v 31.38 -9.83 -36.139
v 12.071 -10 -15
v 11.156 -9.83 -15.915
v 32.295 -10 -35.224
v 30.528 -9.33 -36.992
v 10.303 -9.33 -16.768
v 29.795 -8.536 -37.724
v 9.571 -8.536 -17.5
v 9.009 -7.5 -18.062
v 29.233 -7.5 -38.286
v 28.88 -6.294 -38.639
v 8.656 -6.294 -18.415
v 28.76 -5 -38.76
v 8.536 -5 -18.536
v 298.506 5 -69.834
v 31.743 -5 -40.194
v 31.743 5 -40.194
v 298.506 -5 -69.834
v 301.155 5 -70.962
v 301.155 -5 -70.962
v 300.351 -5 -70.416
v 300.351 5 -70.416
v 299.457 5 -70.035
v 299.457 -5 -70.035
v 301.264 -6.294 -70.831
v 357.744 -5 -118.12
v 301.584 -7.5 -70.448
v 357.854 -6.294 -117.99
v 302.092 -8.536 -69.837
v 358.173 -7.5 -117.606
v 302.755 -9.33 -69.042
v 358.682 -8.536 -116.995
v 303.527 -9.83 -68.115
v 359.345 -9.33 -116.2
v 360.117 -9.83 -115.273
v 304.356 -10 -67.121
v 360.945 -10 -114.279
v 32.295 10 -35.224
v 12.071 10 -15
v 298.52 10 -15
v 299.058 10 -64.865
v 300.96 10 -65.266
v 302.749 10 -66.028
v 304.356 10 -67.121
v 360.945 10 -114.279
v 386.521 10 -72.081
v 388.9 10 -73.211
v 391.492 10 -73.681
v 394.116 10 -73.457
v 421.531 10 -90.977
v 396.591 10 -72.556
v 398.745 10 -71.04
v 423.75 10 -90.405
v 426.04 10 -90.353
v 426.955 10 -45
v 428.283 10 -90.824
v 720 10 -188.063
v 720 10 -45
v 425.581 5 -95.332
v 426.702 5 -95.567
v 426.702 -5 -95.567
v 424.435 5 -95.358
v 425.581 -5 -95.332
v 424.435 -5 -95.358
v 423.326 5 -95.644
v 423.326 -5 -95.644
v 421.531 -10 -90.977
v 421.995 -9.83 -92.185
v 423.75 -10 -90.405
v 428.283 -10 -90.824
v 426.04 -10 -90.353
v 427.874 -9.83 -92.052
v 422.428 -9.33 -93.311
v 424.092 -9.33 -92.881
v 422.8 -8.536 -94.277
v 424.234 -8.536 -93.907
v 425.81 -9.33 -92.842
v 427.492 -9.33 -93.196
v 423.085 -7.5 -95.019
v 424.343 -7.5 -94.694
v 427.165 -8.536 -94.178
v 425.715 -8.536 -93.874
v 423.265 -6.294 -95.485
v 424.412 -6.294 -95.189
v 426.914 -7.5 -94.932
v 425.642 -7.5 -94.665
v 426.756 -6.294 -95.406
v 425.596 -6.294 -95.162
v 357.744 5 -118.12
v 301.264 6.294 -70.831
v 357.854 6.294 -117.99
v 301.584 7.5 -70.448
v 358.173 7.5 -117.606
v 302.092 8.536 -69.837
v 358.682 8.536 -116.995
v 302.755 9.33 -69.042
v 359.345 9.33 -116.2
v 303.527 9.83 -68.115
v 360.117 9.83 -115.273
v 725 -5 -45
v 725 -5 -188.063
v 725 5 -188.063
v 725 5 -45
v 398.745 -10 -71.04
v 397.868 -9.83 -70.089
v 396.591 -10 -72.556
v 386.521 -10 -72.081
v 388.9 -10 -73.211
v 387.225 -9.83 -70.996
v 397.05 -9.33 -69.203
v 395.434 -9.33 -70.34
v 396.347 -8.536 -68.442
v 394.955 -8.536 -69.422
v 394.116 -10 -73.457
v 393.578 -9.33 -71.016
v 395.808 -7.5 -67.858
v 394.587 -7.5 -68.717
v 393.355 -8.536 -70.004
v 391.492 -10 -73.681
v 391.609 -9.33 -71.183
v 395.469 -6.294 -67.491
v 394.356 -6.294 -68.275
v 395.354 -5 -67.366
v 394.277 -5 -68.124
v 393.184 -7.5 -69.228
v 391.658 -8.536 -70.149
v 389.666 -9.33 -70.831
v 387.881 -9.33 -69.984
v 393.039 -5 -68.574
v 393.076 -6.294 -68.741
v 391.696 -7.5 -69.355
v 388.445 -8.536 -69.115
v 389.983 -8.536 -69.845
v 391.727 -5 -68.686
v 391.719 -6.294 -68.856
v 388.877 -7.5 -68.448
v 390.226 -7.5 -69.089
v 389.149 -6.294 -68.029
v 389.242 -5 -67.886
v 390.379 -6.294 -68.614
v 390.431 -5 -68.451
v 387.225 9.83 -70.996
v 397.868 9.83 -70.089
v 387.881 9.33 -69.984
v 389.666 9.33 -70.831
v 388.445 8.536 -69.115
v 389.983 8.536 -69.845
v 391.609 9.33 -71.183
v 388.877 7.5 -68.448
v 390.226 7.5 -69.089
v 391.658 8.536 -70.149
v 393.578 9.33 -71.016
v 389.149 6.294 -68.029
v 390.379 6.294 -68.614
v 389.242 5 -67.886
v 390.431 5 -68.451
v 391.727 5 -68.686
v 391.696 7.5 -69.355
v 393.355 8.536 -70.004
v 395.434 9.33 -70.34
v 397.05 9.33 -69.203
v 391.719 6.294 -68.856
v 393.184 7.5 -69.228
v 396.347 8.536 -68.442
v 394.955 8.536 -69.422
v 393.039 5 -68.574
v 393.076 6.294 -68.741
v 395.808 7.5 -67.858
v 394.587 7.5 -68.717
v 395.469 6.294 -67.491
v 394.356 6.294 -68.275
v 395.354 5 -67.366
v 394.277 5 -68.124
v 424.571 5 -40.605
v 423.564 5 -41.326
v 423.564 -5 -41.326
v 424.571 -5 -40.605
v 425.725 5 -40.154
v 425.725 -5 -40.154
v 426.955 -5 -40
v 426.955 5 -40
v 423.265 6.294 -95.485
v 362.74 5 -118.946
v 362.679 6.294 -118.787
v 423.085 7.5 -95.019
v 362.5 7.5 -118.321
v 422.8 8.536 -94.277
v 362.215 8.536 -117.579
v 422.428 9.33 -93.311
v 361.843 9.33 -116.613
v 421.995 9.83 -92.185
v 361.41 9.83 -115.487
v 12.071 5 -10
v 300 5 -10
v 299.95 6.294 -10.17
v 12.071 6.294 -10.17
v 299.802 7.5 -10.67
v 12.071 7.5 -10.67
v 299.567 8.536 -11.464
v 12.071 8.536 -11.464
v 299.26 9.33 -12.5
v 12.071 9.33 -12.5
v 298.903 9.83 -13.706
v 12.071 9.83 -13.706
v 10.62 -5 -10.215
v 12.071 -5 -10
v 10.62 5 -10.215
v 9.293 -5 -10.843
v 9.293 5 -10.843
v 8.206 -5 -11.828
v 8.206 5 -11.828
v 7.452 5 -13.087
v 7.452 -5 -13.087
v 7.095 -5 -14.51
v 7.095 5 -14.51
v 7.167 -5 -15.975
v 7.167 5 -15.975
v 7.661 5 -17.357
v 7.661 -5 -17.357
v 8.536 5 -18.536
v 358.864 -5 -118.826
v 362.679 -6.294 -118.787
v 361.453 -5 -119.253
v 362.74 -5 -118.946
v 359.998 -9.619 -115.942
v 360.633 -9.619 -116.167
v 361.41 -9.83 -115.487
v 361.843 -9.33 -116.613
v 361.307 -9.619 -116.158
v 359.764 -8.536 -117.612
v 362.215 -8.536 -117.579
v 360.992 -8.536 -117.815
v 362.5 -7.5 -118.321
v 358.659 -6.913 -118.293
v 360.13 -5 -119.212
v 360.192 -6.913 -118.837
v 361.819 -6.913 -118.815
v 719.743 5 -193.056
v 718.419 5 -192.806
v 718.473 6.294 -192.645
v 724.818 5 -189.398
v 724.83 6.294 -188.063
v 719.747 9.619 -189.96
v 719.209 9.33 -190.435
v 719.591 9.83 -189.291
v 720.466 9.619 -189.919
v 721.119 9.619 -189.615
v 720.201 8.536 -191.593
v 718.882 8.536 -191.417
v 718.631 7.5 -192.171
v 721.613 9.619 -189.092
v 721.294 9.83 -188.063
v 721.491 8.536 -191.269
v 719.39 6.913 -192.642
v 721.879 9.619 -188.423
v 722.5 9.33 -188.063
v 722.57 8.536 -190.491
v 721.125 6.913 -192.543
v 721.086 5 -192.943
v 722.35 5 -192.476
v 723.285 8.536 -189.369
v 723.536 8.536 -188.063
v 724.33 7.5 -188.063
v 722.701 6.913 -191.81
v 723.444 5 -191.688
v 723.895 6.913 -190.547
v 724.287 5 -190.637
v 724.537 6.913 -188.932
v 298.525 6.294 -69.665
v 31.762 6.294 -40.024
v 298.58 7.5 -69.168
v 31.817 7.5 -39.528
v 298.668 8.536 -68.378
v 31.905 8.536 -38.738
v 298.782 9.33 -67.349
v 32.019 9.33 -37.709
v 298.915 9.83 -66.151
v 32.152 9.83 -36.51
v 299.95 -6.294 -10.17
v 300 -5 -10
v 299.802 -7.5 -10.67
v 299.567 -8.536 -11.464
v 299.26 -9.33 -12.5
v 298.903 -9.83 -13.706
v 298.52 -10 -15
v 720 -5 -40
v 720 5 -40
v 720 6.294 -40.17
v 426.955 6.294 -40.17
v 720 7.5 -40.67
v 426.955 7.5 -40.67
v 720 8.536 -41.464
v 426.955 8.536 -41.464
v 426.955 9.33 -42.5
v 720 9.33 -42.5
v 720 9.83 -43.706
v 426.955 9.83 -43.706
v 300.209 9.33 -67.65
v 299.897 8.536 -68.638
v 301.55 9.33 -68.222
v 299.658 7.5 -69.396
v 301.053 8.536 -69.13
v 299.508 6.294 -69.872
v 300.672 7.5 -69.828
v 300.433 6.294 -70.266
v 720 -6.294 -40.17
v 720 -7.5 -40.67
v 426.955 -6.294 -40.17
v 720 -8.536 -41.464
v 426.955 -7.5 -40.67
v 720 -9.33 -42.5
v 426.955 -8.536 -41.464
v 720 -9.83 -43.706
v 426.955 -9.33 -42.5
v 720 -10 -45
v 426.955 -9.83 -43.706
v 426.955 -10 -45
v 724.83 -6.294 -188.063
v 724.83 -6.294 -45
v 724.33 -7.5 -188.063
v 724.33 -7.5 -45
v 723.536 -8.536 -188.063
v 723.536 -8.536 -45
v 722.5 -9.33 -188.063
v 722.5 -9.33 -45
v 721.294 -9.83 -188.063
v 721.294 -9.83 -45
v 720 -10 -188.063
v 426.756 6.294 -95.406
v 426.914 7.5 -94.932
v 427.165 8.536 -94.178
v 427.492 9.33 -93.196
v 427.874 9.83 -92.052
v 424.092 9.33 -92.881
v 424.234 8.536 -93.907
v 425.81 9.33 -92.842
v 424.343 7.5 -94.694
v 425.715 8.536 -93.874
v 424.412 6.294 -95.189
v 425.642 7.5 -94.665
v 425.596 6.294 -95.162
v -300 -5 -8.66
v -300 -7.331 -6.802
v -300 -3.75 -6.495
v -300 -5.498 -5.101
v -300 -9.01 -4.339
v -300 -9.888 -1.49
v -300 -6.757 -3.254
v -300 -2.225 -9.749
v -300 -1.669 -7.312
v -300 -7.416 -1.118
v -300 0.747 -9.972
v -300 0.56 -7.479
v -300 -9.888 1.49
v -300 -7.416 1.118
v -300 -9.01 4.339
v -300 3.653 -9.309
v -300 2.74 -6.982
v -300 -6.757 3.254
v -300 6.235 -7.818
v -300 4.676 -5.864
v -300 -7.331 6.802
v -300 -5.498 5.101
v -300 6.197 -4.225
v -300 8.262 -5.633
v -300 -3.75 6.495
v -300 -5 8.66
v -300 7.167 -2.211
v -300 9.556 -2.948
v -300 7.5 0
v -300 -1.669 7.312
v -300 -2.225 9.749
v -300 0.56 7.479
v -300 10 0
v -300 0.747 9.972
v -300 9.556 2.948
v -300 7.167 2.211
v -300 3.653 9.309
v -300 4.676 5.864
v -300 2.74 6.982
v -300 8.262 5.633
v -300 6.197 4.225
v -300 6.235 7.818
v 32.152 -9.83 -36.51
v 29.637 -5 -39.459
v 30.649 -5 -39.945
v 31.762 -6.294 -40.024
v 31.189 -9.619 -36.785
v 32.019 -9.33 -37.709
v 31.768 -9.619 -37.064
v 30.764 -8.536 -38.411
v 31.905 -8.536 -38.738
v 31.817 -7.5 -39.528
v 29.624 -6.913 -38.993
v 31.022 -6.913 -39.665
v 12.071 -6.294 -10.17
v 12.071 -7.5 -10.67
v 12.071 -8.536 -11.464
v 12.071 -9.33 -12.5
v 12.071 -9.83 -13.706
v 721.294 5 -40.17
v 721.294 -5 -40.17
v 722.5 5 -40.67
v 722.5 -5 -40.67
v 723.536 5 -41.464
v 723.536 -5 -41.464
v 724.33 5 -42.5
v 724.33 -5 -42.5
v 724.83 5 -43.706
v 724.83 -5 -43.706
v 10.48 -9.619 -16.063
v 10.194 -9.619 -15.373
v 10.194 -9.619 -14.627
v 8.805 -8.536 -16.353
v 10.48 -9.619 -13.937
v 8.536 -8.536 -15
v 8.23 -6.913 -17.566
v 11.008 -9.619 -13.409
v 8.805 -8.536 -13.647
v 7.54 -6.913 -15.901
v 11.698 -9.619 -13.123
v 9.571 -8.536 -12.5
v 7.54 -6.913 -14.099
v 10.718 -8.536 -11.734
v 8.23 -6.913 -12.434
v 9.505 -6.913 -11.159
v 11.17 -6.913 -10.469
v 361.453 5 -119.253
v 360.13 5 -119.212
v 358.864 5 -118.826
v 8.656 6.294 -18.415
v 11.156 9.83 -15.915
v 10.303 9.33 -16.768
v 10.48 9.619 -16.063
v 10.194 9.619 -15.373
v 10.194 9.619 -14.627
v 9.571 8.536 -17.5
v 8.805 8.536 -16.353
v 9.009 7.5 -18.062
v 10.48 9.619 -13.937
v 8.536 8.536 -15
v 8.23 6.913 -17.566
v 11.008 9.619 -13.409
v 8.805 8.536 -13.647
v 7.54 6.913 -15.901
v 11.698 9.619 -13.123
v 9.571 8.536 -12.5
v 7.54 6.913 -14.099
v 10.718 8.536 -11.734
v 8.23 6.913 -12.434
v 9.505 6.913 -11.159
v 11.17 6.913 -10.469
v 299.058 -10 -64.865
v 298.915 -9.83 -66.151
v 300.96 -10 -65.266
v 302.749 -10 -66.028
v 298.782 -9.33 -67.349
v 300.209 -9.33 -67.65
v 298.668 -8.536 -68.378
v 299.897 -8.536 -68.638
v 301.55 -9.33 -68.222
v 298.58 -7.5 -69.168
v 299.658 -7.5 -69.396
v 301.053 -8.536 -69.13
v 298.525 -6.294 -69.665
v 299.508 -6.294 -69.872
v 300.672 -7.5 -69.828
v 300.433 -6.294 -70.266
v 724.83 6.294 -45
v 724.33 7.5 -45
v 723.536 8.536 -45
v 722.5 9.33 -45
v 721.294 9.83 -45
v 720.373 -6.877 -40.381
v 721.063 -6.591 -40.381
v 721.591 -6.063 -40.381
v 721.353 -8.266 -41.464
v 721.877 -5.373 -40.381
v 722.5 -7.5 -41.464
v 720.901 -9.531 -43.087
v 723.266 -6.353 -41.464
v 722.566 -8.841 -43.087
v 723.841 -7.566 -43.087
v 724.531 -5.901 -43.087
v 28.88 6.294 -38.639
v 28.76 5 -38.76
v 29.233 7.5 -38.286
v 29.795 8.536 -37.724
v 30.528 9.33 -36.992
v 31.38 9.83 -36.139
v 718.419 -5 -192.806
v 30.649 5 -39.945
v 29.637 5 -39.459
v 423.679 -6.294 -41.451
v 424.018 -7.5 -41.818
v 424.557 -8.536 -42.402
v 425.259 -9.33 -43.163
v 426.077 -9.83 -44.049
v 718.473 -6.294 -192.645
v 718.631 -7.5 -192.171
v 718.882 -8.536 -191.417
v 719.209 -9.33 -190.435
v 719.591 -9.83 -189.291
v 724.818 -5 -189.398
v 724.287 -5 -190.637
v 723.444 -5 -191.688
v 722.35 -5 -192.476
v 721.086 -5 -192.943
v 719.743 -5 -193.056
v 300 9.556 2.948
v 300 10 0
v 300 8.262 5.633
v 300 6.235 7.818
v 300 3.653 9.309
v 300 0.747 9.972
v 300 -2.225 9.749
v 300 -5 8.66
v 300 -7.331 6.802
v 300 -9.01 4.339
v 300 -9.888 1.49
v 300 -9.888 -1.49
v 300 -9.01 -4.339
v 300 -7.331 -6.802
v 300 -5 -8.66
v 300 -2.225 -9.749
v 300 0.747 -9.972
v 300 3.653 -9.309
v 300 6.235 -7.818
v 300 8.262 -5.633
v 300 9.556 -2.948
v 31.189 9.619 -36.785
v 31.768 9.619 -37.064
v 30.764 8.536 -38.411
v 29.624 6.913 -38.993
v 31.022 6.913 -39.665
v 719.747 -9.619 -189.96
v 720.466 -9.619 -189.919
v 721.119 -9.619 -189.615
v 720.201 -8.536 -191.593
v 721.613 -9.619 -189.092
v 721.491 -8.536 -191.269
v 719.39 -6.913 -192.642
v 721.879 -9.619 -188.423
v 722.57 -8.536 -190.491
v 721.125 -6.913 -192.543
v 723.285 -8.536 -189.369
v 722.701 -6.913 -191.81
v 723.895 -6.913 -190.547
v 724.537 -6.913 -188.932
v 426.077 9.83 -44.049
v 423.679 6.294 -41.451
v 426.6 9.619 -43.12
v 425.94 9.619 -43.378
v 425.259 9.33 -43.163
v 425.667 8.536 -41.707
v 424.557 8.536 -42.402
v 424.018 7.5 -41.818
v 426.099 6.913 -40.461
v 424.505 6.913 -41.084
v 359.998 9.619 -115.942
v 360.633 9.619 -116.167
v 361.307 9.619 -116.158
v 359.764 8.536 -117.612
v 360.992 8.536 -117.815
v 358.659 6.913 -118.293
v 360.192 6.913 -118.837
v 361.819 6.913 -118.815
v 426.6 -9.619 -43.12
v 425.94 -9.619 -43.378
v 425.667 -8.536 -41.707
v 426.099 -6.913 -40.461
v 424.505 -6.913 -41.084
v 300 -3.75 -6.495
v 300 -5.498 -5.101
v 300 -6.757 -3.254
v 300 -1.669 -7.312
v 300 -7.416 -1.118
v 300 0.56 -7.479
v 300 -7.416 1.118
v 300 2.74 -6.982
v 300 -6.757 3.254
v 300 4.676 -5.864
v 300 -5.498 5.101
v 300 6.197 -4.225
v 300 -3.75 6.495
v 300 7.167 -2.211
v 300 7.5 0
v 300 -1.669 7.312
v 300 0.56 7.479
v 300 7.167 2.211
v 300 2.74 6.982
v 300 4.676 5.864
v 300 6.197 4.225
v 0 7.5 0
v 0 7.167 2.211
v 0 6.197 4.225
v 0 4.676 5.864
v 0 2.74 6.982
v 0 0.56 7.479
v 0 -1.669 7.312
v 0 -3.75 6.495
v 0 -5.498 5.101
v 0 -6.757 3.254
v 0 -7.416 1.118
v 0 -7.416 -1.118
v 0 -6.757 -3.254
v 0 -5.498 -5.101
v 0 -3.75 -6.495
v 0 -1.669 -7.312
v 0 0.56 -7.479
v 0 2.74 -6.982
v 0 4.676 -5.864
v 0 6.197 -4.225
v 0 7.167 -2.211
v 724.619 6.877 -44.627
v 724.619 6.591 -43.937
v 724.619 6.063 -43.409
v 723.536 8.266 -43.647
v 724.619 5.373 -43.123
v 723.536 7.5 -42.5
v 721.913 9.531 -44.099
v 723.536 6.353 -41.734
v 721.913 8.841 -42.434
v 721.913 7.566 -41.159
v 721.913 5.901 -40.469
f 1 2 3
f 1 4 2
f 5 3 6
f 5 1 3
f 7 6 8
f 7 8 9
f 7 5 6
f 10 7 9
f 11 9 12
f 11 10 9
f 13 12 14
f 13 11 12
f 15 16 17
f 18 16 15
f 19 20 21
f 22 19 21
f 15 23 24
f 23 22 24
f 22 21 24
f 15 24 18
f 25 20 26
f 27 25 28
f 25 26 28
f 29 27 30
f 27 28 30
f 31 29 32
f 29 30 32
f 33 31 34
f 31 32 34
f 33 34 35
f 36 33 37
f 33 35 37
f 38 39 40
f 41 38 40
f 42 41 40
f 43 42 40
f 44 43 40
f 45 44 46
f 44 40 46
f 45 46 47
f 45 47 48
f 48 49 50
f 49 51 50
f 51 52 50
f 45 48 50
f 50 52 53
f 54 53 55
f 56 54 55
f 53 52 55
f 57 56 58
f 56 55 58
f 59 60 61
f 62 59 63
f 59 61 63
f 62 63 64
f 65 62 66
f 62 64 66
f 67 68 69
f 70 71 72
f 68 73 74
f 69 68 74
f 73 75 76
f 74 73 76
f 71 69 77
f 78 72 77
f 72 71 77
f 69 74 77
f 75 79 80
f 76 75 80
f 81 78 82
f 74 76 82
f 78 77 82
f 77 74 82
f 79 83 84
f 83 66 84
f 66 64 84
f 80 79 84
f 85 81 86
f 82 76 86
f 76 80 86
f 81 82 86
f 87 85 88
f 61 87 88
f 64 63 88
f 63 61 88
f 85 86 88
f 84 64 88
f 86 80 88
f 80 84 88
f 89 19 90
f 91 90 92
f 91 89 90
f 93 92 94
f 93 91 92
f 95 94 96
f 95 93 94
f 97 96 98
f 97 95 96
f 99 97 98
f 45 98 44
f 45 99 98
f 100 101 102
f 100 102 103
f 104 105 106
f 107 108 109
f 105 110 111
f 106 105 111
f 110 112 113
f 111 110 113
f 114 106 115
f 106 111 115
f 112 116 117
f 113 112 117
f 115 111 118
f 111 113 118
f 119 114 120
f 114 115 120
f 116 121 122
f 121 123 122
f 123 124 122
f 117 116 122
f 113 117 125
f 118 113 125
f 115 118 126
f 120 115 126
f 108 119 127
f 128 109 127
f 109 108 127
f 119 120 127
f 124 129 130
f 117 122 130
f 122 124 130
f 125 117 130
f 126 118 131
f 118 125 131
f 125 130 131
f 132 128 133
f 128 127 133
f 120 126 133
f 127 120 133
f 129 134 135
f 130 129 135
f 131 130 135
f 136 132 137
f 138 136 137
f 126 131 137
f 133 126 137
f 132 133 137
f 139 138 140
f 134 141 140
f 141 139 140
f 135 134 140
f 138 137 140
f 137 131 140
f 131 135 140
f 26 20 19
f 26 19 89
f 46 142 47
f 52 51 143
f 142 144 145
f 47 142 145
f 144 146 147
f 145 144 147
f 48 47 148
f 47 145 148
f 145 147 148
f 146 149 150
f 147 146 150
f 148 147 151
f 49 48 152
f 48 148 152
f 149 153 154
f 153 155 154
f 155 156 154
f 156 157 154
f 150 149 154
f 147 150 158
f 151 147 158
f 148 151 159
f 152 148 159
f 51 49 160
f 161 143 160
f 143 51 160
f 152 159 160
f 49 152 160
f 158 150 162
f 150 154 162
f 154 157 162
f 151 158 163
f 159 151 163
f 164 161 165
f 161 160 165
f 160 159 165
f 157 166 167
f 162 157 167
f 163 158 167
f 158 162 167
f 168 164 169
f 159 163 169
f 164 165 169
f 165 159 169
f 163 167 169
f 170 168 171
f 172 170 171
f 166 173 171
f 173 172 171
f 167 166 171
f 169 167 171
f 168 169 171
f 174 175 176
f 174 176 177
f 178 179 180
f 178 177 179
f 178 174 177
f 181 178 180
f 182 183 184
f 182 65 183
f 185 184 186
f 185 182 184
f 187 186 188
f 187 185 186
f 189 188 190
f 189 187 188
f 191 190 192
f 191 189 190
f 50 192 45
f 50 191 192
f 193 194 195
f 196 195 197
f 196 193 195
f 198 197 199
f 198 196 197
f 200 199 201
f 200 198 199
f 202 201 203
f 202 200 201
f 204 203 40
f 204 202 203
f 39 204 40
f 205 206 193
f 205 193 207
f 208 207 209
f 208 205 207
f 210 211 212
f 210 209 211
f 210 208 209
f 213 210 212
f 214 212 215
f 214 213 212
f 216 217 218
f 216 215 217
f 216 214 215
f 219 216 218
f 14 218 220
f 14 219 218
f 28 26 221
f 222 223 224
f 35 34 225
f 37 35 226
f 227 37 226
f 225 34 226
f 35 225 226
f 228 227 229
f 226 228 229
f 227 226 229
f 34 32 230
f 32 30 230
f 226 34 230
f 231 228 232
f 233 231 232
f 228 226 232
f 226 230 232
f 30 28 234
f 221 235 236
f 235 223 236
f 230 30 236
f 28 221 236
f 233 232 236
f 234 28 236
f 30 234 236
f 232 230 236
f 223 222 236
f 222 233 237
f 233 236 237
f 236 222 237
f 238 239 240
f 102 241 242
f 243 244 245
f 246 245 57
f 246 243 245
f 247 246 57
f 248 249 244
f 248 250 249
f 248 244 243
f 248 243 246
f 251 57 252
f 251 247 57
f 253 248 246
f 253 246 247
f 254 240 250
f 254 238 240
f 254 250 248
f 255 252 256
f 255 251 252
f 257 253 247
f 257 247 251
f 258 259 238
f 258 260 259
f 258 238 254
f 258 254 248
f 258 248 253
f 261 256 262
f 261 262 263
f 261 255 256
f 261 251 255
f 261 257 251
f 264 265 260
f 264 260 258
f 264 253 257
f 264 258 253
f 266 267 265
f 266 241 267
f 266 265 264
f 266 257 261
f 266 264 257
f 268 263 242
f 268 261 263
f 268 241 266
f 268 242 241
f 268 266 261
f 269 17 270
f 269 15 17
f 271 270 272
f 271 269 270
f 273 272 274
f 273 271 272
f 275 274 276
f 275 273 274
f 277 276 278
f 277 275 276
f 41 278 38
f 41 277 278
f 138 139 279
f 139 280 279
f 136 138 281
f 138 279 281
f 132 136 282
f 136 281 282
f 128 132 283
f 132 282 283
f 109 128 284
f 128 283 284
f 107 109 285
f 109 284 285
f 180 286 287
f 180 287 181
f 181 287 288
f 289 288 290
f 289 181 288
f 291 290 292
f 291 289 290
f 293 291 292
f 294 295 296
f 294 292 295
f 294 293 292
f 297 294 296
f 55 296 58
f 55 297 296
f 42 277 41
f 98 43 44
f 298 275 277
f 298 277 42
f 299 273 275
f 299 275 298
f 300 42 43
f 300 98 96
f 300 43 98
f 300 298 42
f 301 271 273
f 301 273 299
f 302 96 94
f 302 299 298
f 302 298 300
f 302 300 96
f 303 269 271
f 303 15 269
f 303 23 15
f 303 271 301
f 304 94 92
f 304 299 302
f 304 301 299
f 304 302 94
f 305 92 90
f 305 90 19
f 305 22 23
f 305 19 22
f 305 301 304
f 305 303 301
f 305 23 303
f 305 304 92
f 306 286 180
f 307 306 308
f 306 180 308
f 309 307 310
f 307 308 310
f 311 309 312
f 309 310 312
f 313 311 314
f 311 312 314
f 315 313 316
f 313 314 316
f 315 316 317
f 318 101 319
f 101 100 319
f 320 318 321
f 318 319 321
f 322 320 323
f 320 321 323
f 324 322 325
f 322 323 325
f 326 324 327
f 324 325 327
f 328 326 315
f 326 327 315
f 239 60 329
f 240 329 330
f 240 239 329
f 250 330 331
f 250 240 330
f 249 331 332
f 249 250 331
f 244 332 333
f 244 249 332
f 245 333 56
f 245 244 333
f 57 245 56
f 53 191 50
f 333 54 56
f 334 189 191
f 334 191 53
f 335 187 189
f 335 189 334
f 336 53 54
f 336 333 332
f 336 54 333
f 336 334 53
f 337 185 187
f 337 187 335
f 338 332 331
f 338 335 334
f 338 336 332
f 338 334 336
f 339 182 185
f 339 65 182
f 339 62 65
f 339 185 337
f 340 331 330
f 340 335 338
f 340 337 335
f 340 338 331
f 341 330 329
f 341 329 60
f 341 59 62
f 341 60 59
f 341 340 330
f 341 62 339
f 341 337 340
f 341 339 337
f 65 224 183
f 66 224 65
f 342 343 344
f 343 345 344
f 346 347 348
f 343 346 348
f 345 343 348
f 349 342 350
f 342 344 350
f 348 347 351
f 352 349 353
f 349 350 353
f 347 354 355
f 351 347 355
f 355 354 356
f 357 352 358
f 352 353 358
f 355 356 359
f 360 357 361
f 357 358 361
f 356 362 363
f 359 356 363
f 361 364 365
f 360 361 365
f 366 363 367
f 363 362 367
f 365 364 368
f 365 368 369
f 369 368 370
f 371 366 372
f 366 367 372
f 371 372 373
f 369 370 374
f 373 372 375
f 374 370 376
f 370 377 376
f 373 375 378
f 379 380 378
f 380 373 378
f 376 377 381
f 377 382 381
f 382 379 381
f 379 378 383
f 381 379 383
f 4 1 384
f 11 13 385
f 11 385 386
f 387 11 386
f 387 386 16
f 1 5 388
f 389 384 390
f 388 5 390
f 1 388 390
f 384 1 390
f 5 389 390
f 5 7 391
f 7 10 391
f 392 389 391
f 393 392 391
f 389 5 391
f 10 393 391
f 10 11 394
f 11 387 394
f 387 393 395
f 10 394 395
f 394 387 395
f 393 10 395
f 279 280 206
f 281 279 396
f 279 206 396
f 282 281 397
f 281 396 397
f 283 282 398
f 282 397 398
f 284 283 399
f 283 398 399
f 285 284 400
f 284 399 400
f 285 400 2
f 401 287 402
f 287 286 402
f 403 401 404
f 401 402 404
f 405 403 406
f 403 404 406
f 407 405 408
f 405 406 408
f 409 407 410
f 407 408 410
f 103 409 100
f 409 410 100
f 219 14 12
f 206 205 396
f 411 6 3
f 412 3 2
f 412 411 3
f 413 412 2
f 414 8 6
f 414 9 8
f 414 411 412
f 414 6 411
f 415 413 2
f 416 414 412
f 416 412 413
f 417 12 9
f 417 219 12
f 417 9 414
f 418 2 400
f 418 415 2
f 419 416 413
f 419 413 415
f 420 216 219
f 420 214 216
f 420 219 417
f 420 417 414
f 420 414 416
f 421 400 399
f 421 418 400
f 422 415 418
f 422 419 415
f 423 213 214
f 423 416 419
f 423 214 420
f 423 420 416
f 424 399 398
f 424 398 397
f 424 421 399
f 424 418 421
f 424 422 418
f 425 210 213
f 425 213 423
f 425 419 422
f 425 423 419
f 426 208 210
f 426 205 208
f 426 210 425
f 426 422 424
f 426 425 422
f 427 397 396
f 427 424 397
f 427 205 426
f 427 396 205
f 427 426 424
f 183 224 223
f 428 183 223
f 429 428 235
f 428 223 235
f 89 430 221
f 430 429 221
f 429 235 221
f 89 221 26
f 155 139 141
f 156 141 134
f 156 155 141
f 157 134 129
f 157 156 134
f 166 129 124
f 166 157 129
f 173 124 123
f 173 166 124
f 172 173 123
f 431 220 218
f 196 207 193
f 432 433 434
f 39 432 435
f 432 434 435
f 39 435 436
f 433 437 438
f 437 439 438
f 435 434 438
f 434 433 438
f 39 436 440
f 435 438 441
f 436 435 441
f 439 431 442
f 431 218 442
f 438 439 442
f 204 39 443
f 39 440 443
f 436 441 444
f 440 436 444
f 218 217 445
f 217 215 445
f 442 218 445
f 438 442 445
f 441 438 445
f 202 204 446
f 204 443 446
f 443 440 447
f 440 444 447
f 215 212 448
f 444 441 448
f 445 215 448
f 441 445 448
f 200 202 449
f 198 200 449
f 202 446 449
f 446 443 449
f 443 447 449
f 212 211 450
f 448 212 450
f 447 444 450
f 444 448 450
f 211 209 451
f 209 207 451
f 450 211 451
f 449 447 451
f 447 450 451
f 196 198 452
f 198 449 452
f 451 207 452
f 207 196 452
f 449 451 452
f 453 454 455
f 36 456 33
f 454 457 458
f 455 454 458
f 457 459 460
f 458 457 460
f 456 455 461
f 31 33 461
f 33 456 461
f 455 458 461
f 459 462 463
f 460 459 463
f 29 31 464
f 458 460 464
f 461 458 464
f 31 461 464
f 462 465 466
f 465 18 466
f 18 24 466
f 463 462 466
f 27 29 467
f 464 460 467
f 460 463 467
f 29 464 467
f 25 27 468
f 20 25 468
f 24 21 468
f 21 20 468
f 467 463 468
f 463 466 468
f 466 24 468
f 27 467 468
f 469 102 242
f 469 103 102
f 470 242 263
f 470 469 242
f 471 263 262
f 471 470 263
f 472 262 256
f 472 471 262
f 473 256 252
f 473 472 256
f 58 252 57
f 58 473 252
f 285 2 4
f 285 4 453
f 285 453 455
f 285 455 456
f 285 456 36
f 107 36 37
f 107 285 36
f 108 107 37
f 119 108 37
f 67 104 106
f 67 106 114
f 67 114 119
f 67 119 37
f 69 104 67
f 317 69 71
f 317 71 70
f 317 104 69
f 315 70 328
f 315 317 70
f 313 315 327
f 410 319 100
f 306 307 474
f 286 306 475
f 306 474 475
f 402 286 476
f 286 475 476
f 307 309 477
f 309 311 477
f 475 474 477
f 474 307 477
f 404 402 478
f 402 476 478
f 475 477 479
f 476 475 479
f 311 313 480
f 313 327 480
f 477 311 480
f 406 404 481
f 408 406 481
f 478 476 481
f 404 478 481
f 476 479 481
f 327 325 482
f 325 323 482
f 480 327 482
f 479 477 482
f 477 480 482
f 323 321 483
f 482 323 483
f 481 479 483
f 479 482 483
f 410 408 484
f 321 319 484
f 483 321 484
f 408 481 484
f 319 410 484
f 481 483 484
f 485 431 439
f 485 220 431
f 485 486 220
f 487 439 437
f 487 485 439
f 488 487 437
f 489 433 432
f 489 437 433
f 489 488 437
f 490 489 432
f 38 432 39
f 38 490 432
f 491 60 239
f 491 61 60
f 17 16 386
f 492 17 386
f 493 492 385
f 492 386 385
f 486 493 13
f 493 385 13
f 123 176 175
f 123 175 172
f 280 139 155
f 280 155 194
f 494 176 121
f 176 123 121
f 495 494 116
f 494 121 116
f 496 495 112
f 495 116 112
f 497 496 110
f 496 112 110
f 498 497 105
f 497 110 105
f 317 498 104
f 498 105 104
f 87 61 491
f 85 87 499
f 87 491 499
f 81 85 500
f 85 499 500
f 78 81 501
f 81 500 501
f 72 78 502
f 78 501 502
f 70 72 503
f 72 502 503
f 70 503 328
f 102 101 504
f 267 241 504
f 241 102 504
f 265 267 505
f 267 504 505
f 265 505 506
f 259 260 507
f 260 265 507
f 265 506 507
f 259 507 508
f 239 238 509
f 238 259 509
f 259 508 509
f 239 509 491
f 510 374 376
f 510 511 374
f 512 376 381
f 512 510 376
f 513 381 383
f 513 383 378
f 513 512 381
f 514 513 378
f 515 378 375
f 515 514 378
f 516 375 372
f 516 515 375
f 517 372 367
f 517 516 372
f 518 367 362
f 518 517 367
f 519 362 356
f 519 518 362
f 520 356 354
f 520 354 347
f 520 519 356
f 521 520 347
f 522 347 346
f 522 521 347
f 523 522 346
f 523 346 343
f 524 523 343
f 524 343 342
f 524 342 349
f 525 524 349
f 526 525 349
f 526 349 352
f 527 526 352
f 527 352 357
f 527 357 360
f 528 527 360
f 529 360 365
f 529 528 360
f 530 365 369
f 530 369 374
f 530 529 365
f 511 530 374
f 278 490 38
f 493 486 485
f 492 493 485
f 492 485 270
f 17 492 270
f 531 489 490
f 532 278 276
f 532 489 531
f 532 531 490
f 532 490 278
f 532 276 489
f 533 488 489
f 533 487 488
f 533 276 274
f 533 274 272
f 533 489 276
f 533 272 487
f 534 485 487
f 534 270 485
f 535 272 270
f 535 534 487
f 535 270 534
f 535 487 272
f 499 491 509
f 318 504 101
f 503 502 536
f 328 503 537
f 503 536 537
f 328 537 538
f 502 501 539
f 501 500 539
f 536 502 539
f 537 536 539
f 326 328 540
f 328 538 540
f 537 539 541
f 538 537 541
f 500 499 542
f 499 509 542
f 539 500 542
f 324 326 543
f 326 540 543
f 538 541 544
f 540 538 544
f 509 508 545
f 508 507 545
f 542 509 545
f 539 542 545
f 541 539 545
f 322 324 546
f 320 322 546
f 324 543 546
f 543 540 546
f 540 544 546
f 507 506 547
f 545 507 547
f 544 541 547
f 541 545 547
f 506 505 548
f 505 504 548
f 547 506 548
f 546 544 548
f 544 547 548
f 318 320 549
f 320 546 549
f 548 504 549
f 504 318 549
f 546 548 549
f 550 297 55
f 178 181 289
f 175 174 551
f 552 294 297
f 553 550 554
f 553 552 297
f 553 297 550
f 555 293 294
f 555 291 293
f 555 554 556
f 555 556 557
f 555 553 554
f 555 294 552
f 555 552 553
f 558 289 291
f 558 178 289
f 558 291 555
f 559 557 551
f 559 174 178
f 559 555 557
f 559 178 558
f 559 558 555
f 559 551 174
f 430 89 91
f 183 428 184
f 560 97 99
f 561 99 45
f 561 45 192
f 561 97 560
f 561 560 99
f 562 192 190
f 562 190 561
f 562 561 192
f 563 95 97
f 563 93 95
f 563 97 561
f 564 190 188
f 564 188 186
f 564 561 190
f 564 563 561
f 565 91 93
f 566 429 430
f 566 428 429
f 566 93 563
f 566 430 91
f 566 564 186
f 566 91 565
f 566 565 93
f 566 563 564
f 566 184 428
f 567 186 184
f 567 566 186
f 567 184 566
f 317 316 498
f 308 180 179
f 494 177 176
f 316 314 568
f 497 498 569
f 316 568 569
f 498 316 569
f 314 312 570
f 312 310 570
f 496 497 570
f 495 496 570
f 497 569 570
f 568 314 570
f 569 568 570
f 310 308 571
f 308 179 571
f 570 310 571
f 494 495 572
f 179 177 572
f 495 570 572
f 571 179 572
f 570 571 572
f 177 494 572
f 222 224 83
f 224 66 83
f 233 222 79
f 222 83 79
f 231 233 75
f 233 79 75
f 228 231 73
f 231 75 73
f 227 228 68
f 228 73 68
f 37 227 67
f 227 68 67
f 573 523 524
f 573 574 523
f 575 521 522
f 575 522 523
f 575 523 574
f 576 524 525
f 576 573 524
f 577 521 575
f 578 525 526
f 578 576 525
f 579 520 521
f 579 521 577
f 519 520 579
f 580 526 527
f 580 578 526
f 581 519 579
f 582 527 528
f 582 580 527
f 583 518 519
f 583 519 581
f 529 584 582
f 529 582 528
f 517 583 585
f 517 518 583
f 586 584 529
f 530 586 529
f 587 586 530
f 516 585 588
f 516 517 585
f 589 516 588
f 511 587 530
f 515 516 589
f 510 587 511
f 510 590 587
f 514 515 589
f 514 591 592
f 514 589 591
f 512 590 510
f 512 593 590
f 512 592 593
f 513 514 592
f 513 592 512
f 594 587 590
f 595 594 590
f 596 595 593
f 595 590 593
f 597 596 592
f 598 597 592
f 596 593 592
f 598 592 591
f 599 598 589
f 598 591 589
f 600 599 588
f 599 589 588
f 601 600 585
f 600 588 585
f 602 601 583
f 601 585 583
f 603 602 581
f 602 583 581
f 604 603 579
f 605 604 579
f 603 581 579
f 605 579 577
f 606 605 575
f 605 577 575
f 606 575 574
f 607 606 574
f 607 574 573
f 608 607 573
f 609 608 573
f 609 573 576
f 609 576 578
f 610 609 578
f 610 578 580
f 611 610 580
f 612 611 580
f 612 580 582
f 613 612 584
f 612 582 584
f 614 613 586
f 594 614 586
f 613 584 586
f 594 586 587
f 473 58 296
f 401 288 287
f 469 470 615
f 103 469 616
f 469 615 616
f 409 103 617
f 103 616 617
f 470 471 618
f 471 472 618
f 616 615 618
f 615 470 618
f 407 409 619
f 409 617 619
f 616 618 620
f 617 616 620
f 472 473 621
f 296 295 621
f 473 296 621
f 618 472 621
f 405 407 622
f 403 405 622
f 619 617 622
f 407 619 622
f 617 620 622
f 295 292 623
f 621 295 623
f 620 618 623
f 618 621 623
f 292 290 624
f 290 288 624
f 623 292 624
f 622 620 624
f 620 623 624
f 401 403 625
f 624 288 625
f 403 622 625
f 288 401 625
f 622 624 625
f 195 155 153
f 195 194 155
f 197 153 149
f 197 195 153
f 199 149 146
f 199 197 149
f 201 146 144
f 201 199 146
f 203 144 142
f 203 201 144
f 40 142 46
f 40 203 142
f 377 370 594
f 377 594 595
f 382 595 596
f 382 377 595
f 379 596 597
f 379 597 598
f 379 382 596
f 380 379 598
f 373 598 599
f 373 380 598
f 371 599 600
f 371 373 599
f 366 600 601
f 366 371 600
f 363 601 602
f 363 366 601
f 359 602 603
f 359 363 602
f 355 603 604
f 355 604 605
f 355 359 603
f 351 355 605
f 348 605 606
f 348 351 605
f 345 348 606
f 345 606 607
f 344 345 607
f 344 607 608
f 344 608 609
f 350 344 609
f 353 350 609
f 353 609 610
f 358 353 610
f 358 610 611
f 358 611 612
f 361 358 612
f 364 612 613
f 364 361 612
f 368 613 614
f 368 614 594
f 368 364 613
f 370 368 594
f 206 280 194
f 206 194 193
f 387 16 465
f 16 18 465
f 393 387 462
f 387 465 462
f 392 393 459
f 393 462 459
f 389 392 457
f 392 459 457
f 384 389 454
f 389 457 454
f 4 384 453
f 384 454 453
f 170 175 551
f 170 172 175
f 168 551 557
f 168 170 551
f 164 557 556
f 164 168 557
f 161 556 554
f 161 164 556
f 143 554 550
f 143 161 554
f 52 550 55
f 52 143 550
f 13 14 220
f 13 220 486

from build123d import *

# Parameters (mm, degrees)
F0_R     = 10
F1_DEPTH = 300
F2_R     = 7.5
F3_DEPTH = 300
F6_DEPTH = 10
F8_R     = 5


with BuildPart() as f1:
    # F0 (on Right) → F1 (new body)
    with BuildSketch(Plane.YZ):
        Circle(F0_R)
    extrude(amount=F1_DEPTH)

    # F2 (on face) → F3 (cut)
    with BuildSketch(Plane.YZ.offset(300)):
        Circle(F2_R)
    extrude(amount=-F3_DEPTH, mode=Mode.SUBTRACT)

    # F4: F1 across plane


with BuildPart() as f1_1:
    add(f1.part)
    add(f1.part.mirror(Plane.YZ))


with BuildPart() as f6:
    # F5 (on Front) → F6 (new body)
    with BuildSketch(Plane.XZ):
        Polygon((300, -10), (0, -10), (30, -40), (300, -70), (360, -120), (425, -95), (725, -195), (725, -95), (725, -40), (425, -40), (392.5, -70), align=None)
    extrude(amount=F6_DEPTH)

    # F7: F6 across face


with BuildPart() as f6_1:
    add(f6.part)
    add(f6.part.mirror(Plane(origin=(460.7482537362, 0, -77.3639538661), x_dir=(1, 0, 0), z_dir=(0, 1, 0))))

    # F8
    f8_edges = [f6_1.edges().sort_by_distance(p)[0] for p in [
        (15, -10, -25),
        (15, 10, -25),
        (165, 10, -55),
        (165, -10, -55),
        (30, 0, -40),
        (330, -10, -95),
        (330, 10, -95),
        (392.5, -10, -107.5),
        (392.5, 10, -107.5),
        (575, 10, -145),
        (575, -10, -145),
        (725, -10, -117.5),
        (575, -10, -40),
        (408.75, -10, -55),
        (346.25, -10, -40),
        (150, -10, -10),
        (150, 10, -10),
        (346.25, 10, -40),
        (575, 10, -40),
        (408.75, 10, -55),
        (392.5, 0, -70),
        (425, 0, -40),
        (725, 10, -117.5),
        (725, 0, -40),
        (725, 0, -195),
        (425, 0, -95),
        (360, 0, -120),
        (300, 0, -70),
        (0, 0, -10),
    ]]
    fillet(f8_edges, radius=F8_R)


solid = Compound([f1_1.part, f6_1.part])
